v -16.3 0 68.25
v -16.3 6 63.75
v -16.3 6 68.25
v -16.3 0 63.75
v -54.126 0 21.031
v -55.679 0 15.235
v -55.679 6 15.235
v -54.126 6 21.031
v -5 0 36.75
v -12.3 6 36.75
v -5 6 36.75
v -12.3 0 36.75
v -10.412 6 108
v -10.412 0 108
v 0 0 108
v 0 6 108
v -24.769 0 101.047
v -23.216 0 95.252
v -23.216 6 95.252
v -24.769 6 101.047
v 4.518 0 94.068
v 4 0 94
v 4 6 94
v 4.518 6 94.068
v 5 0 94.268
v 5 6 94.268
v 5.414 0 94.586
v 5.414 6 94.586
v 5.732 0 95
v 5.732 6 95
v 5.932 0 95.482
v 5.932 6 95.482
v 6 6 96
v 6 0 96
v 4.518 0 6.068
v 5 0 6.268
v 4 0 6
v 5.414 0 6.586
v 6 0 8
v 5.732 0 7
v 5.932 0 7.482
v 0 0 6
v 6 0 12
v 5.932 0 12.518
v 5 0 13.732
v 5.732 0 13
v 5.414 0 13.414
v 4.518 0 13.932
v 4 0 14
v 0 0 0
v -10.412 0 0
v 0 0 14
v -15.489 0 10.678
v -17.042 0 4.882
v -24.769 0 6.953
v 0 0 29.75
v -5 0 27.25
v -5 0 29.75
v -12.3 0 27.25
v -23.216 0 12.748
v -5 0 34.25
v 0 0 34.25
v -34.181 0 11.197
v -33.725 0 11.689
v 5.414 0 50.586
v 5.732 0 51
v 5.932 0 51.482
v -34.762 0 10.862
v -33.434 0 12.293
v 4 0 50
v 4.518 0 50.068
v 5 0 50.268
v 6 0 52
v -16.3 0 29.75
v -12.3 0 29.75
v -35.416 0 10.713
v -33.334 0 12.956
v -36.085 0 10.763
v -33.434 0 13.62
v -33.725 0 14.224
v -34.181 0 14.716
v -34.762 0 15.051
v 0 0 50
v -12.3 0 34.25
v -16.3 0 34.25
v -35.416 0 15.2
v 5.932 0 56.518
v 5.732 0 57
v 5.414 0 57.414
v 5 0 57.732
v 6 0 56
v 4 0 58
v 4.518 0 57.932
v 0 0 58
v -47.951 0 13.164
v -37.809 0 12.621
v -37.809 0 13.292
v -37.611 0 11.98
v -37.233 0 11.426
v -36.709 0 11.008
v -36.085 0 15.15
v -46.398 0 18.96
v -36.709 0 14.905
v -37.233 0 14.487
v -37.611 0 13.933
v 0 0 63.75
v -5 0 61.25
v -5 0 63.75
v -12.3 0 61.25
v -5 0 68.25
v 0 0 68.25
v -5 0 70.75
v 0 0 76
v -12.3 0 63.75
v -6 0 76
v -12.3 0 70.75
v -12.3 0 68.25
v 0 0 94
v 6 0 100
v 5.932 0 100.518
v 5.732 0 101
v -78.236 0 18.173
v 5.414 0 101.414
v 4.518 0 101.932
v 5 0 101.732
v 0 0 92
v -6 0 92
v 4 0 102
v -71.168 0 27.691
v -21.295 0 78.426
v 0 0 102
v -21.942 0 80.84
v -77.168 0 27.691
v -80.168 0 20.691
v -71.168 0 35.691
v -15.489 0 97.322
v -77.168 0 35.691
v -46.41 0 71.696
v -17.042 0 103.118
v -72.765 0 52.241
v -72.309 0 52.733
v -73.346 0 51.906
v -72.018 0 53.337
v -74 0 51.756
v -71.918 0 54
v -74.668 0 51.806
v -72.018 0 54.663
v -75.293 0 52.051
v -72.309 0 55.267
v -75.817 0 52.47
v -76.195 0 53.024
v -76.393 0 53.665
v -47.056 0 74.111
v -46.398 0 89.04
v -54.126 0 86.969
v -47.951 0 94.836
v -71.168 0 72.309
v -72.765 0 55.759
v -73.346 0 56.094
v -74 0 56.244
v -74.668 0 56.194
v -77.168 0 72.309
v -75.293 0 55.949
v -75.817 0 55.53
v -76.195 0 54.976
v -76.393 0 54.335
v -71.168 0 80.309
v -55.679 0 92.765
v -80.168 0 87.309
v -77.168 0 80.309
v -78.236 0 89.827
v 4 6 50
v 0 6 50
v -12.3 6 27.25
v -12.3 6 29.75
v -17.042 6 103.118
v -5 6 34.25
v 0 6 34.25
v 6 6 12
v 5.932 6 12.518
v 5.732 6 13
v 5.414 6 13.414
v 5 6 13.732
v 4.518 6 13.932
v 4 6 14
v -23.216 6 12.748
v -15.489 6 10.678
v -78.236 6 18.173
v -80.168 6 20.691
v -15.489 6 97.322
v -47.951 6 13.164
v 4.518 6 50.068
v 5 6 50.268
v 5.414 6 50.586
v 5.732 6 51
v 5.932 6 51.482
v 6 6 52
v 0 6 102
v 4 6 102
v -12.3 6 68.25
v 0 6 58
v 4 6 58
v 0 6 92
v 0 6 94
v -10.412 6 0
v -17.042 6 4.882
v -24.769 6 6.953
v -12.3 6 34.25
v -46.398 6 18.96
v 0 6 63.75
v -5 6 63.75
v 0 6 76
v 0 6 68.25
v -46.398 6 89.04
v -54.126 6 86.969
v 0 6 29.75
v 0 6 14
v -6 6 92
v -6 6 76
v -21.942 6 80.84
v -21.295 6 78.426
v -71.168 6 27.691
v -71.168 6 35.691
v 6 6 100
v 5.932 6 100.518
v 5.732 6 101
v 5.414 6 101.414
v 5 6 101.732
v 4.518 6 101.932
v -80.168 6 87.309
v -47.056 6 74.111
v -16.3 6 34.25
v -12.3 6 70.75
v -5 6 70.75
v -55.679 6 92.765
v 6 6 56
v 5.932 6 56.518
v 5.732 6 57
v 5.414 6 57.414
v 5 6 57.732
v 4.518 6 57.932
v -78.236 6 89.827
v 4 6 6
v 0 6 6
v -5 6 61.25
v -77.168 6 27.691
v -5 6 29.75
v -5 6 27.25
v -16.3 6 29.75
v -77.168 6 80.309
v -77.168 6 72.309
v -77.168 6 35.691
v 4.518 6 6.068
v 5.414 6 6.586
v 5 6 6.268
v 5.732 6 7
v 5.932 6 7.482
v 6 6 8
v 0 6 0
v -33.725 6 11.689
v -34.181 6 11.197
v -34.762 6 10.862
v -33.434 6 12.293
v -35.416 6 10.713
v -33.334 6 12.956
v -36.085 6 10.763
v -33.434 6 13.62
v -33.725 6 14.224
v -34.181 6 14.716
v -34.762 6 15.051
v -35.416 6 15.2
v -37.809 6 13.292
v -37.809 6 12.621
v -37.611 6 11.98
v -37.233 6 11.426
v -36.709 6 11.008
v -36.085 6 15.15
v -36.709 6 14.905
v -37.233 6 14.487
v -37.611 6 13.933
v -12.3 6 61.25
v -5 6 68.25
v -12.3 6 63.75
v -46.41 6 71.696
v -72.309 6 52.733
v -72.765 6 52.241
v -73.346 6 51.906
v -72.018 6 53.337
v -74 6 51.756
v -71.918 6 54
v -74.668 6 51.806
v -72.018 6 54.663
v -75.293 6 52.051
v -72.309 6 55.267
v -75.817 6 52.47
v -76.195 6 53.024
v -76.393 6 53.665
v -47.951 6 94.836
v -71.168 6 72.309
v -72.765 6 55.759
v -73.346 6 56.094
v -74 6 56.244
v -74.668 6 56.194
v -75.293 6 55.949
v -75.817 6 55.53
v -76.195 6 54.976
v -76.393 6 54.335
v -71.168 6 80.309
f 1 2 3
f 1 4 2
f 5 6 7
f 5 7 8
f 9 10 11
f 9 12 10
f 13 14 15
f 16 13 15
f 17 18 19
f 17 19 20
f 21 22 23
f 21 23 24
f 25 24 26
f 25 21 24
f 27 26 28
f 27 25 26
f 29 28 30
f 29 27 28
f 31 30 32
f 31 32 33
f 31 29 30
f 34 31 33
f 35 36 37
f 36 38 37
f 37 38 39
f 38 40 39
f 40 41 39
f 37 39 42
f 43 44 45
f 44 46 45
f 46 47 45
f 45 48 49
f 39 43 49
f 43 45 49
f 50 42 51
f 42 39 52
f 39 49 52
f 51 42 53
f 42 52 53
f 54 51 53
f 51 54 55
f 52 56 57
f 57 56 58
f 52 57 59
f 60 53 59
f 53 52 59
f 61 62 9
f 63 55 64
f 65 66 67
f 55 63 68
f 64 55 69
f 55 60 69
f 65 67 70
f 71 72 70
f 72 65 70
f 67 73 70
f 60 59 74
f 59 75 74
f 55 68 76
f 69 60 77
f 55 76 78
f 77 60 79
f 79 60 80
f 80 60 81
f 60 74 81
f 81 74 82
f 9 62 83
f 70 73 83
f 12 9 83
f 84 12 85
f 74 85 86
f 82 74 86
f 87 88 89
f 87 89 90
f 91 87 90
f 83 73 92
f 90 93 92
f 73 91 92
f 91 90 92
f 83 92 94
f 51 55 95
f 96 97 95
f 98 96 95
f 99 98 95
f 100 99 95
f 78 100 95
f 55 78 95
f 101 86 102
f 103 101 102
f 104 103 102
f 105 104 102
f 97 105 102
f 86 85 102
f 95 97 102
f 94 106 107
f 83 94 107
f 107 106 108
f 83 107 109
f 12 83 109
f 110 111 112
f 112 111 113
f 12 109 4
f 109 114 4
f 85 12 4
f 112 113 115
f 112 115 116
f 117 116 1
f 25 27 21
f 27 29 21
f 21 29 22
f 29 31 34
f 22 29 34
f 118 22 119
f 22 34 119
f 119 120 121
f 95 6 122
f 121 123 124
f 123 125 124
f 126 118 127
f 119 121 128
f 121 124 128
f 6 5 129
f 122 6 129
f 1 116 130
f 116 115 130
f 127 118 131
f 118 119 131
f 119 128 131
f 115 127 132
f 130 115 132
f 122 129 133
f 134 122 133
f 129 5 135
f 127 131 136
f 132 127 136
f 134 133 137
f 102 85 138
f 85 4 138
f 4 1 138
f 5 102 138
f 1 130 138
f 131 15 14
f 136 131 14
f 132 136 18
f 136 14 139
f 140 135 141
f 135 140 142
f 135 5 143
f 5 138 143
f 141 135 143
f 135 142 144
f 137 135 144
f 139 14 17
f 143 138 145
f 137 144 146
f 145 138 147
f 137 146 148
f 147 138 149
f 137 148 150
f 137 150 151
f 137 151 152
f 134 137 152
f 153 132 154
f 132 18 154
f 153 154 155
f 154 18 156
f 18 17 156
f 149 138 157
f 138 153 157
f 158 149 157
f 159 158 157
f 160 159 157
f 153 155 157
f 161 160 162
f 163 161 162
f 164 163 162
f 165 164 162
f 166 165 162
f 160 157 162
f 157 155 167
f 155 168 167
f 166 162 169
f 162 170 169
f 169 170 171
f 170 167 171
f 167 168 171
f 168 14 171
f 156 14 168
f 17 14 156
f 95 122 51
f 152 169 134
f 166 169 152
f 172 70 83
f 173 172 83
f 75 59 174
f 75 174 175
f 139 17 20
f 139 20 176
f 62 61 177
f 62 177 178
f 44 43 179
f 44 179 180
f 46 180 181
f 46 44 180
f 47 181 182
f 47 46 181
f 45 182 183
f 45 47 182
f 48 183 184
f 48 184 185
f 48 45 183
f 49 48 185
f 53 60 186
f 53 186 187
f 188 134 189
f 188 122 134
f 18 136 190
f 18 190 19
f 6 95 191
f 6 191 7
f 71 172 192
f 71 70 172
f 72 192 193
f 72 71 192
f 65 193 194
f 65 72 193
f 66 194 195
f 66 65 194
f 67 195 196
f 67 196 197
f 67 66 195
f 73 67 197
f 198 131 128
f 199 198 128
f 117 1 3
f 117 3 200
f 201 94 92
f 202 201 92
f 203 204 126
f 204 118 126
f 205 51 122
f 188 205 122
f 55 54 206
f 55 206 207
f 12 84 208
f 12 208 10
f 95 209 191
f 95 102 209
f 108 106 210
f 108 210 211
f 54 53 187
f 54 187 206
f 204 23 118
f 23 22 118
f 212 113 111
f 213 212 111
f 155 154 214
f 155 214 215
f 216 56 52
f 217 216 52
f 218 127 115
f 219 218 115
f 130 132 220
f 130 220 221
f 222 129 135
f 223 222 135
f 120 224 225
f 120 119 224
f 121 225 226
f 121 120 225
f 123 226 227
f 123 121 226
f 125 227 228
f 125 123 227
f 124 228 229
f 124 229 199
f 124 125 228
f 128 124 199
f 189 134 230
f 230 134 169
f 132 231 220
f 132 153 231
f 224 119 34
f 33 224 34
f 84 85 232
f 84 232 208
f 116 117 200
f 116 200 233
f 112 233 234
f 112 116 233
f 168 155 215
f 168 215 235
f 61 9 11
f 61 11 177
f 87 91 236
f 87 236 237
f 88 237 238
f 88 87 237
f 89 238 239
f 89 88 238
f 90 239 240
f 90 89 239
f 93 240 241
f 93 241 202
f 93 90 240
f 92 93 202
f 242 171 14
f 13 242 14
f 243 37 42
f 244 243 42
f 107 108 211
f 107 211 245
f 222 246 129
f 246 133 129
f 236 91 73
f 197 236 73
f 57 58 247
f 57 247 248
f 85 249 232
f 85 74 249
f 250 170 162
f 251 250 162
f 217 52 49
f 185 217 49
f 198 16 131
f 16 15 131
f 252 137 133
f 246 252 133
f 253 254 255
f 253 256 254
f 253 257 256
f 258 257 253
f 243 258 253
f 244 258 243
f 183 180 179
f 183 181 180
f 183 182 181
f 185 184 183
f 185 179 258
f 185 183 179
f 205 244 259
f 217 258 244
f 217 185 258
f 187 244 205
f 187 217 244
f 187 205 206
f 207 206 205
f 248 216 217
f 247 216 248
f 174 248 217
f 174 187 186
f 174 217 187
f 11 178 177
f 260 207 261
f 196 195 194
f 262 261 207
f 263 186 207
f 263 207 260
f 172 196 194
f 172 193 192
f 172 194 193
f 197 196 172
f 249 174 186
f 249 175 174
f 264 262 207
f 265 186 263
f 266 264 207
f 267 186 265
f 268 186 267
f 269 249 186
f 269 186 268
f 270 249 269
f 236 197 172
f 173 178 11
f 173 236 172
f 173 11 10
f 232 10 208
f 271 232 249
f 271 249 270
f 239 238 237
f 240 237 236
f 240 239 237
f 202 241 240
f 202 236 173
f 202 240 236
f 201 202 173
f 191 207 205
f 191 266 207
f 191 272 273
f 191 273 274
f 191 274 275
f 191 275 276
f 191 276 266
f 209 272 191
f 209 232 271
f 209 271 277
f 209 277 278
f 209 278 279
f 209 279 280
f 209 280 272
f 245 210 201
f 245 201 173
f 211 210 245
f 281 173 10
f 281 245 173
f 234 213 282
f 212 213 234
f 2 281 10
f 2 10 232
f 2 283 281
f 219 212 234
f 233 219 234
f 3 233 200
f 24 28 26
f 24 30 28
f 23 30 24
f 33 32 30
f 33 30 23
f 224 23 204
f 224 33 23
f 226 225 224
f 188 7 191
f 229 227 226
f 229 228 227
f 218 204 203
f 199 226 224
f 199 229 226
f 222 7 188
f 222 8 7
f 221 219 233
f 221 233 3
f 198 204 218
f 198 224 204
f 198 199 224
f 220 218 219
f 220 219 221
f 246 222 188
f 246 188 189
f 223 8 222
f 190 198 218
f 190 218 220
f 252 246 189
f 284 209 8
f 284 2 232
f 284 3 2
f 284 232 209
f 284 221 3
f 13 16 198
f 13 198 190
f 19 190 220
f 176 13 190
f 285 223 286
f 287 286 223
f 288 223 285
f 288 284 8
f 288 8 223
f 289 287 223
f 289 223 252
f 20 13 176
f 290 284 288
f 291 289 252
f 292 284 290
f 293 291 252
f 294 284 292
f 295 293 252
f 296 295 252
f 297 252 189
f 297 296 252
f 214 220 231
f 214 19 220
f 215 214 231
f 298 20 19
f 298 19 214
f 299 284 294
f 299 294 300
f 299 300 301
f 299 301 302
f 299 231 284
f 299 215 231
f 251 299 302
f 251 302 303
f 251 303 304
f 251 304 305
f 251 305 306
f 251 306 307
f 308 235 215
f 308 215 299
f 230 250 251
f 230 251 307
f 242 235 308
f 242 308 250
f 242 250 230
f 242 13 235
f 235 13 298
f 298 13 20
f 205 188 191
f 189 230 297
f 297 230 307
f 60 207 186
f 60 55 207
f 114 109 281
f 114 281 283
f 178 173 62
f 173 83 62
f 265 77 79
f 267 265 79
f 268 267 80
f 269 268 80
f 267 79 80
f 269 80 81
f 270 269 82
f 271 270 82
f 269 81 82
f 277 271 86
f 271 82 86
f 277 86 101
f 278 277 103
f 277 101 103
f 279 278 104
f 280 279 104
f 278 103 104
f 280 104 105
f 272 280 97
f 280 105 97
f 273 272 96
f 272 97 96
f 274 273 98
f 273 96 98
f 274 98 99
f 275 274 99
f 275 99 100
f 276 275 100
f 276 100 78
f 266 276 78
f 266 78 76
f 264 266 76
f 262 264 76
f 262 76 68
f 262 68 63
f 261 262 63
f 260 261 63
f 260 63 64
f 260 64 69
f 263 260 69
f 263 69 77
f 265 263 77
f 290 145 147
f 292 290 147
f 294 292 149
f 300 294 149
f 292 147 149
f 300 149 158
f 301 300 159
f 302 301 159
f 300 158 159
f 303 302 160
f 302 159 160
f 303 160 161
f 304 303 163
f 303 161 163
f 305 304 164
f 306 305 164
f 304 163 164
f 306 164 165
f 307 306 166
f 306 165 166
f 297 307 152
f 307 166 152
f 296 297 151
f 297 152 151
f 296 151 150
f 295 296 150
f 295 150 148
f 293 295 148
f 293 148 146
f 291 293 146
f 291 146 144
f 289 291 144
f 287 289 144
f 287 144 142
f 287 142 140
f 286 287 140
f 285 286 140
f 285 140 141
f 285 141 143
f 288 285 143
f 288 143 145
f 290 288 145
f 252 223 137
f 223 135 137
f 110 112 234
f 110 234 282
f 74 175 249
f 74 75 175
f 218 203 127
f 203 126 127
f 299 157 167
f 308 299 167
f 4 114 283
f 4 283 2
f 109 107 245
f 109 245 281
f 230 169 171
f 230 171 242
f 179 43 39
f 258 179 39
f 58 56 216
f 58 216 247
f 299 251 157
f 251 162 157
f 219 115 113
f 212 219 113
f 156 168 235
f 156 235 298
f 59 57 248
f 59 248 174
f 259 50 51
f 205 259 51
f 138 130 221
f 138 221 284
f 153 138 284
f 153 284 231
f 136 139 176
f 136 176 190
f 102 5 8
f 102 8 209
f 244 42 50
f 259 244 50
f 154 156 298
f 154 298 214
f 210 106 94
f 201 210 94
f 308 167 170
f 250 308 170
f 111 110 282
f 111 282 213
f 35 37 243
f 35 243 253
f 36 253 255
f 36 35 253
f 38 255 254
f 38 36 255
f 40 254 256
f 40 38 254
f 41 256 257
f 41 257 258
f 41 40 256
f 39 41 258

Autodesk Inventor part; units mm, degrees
ref_plane "YZ Plane" through (0, 0, 0) normal (1, 0, 0) x (0, 1, 0)
ref_plane "XZ Plane" through (0, 0, 0) normal (0, 1, 0) x (-1, 0, 0)
ref_plane "XY Plane" through (0, 0, 0) normal (0, 0, 1) x (1, 0, 0)
sketch "Sketch1" plane through (0, 0, 0) normal (0, 1, 0) x (-1, 0, 0)
  line L0 (0, 108) -> (0, 0)
  line L1 (0, 0) -> (10.412, 0)
  line L2 (10.412, 0) -> (80.1677, 18.691)
  line L3 (80.1677, 18.691) -> (80.1677, 89.309)
  line L4 (80.1677, 89.309) -> (10.412, 108)
  line L5 (10.412, 108) -> (0, 108)
  line L6 (2.5529, 107) -> (1, 101.2044) construction
  line L7 (1, 101.2044) -> (68.6148, 83.0871) construction
  line L8 (68.6148, 83.0871) -> (70.1677, 88.8827) construction
  line L9 (70.1677, 88.8827) -> (2.5529, 107) construction
  line L10 (1, 6.7956) -> (2.5529, 1) construction
  line L11 (2.5529, 1) -> (70.1677, 19.1173) construction
  line L12 (70.1677, 19.1173) -> (68.6148, 24.9129) construction
  line L13 (68.6148, 24.9129) -> (1, 6.7956) construction
  line L14 (71.1677, 88.309) -> (77.1677, 88.309) construction
  line L15 (77.1677, 88.309) -> (77.1677, 19.691) construction
  line L16 (77.1677, 19.691) -> (71.1677, 19.691) construction
  line L17 (71.1677, 19.691) -> (71.1677, 88.309) construction
  line L18 (17.0418, 103.1177) -> (15.4889, 97.3222)
  line L19 (15.4889, 97.3222) -> (23.2163, 95.2516)
  line L20 (23.2163, 95.2516) -> (24.7692, 101.0472)
  line L21 (24.7692, 101.0472) -> (17.0418, 103.1177)
  line L22 (47.9514, 94.8355) -> (46.3985, 89.0399)
  line L23 (46.3985, 89.0399) -> (54.1259, 86.9694)
  line L24 (54.1259, 86.9694) -> (55.6788, 92.765)
  line L25 (55.6788, 92.765) -> (47.9514, 94.8355)
  line L26 (15.4889, 10.6778) -> (17.0418, 4.8823)
  line L27 (17.0418, 4.8823) -> (24.7692, 6.9528)
  line L28 (24.7692, 6.9528) -> (23.2163, 12.7484)
  line L29 (23.2163, 12.7484) -> (15.4889, 10.6778)
  line L30 (46.3985, 18.9601) -> (47.9514, 13.1645)
  line L31 (47.9514, 13.1645) -> (55.6788, 15.235)
  line L32 (55.6788, 15.235) -> (54.1259, 21.0306)
  line L33 (54.1259, 21.0306) -> (46.3985, 18.9601)
  line L34 (54.9024, 89.8672) -> (69.3913, 85.9849) construction
  line L35 (16.2653, 7.7801) -> (1.7765, 3.8978) construction
  line L36 (54.9024, 18.1328) -> (69.3913, 22.0151) construction
  line L37 (16.2653, 100.2199) -> (1.7765, 104.1022) construction
  line L38 (71.1677, 80.309) -> (77.1677, 80.309)
  line L39 (77.1677, 80.309) -> (77.1677, 72.309)
  line L40 (77.1677, 72.309) -> (71.1677, 72.309)
  line L41 (71.1677, 72.309) -> (71.1677, 80.309)
  line L42 (71.1677, 35.691) -> (77.1677, 35.691)
  line L43 (77.1677, 35.691) -> (77.1677, 27.691)
  line L44 (77.1677, 27.691) -> (71.1677, 27.691)
  line L45 (71.1677, 27.691) -> (71.1677, 35.691)
  line L46 (74.1677, 80.309) -> (74.1677, 88.309) construction
  line L47 (74.1677, 27.691) -> (74.1677, 19.691) construction
  dimension "d0" = 70
  dimension "d1" = 6
  dimension "d3" = 70
  dimension "d4" = 6
  dimension "d7" = 3
  dimension "d8" = 3
  dimension "d9" = 6
  dimension "d10" = 3
  dimension "d11" = 1
  dimension "d12" = 1
  dimension "d13" = 1
  dimension "d14" = 1
  dimension "d15" = 15
  dimension "d16" = 1
  dimension "d17" = 1
  dimension "d18" = 1
  dimension "d19" = 108
  dimension "d20" = 8
  dimension "d21" = 15
  dimension "d22" = 8
extrude "Extrusion7" add sketch "Sketch1" along normal blind 6
sketch "Sketch7" plane through (0, 0, 0) normal (0, -1, 0) x (1, 0, 0)
  line L0 (0, 0) -> (0, 108) projected
  line L1 (0, 92) -> (-6, 92)
  line L2 (-6, 92) -> (-6, 76)
  line L3 (-6, 76) -> (0, 76)
  line L4 (0, 76) -> (0, 92)
  dimension "d74" = 16
  dimension "d75" = 16
  dimension "d76" = 6
extrude "Extrusion8" cut sketch "Sketch7" against normal blind 6
sketch "Sketch8" plane through (0, 0, 0) normal (0, -1, 0) x (1, 0, 0)
  line L0 (-77.1677, 72.309) -> (-71.1677, 35.691) construction
  line L1 (-77.1677, 35.691) -> (-71.1677, 72.309) construction
  circle A0 centre (-74.1677, 54) radius 2.25
  dimension "d80" = 4.5
extrude "Extrusion9" cut sketch "Sketch8" against normal blind 6
sketch "Sketch9" plane through (0, 0, 0) normal (0, -1, 0) x (1, 0, 0)
  line L0 (-46.3985, 18.9601) -> (-24.7692, 6.9528) construction
  line L1 (-23.2163, 12.7484) -> (-47.9514, 13.1645) construction
  circle A0 centre (-35.5839, 12.9564) radius 2.25
  dimension "d83" = 4.5
extrude "Extrusion10" cut sketch "Sketch9" against normal blind 6
sketch "Sketch10" plane through (0, 0, 0) normal (0, -1, 0) x (1, 0, 0)
  line L0 (0, 0) -> (0, 76) projected
  line L1 (0, 68.25) -> (0, 63.75)
  line L2 (-16.3, 63.75) -> (-16.3, 68.25)
  line L3 (-12.3, 70.75) -> (-5, 70.75)
  line L4 (-5, 61.25) -> (-12.3, 61.25)
  line L5 (-16.3, 68.25) -> (-12.3, 68.25)
  line L6 (-5, 68.25) -> (0, 68.25)
  line L7 (0, 63.75) -> (-5, 63.75)
  line L8 (-12.3, 63.75) -> (-16.3, 63.75)
  line L9 (-12.3, 61.25) -> (-12.3, 63.75)
  line L10 (-12.3, 68.25) -> (-12.3, 70.75)
  line L11 (-5, 70.75) -> (-5, 68.25)
  line L12 (-5, 63.75) -> (-5, 61.25)
  line L13 (0, 34.25) -> (0, 29.75)
  line L14 (-16.3, 29.75) -> (-16.3, 34.25)
  line L15 (-12.3, 36.75) -> (-5, 36.75)
  line L16 (-5, 27.25) -> (-12.3, 27.25)
  line L17 (-16.3, 34.25) -> (-12.3, 34.25)
  line L18 (-5, 34.25) -> (0, 34.25)
  line L19 (0, 29.75) -> (-5, 29.75)
  line L20 (-12.3, 29.75) -> (-16.3, 29.75)
  line L21 (-12.3, 27.25) -> (-12.3, 29.75)
  line L22 (-12.3, 34.25) -> (-12.3, 36.75)
  line L23 (-5, 36.75) -> (-5, 34.25)
  line L24 (-5, 29.75) -> (-5, 27.25)
  point P0 (0, 108)
  point P1 (-16.3, 66)
  point P2 (-16.3, 32)
  dimension "d86" = 4.5
  dimension "d87" = 2.5
  dimension "d88" = 2.5
  dimension "d89" = 5
  dimension "d90" = 7.3
  dimension "d91" = 4
  dimension "d92" = 4.5
  dimension "d93" = 2.5
  dimension "d94" = 2.5
  dimension "d95" = 5
  dimension "d96" = 7.3
  dimension "d97" = 4
  dimension "d98" = 42
  dimension "d99" = 34
extrude "Extrusion11" cut sketch "Sketch10" against normal blind 6
sketch "Sketch11" plane through (0, 0, 0) normal (0, -1, 0) x (1, 0, 0)
  line L0 (0, 68.25) -> (0, 76) projected
  line L1 (0, 108) -> (-10.412, 108) projected
  line L2 (-23.2163, 95.2516) -> (-24.7692, 101.0472) projected
  line L3 (-46.4441, 73.7575) -> (-22.296, 80.228) construction
  line L4 (-22.296, 80.228) -> (-21.9078, 78.7791) construction
  line L5 (-21.9078, 78.7791) -> (-46.0559, 72.3086) construction
  line L6 (-46.0559, 72.3086) -> (-46.4441, 73.7575) construction
  line L7 (-47.0565, 74.1111) -> (-21.9424, 80.8404)
  line L8 (-21.9424, 80.8404) -> (-21.2954, 78.4256)
  line L9 (-21.2954, 78.4256) -> (-46.4095, 71.6963)
  line L10 (-46.4095, 71.6963) -> (-47.0565, 74.1111)
  dimension "d102" = 25
  dimension "d103" = 1.5
  dimension "d104" = 0.5
  dimension "d105" = 22.296
  dimension "d106" = 27.772
extrude "Extrusion12" cut sketch "Sketch11" against normal blind 6
chamfer "Chamfer2" distance 2 angle 45 2 edges at (-80.1677, 3, 89.309) (-80.1677, 3, 18.691)
sketch "Sketch12" plane through (0, 0, 0) normal (0, -1, 0) x (1, 0, 0)
  line L0 (0, 0) -> (0, 29.75) projected
  line L1 (0, 34.25) -> (0, 63.75) projected
  line L2 (0, 92) -> (0, 108) projected
  line L3 (0, 108) -> (-10.412, 108) projected
  line L4 (0, 102) -> (4, 102)
  line L5 (6, 100) -> (6, 96)
  line L6 (4, 94) -> (0, 94)
  line L7 (0, 94) -> (0, 102)
  line L8 (0, 58) -> (4, 58)
  line L9 (6, 56) -> (6, 52)
  line L10 (4, 50) -> (0, 50)
  line L11 (0, 50) -> (0, 58)
  line L12 (0, 14) -> (4, 14)
  line L13 (6, 12) -> (6, 8)
  line L14 (4, 6) -> (0, 6)
  line L15 (0, 6) -> (0, 14)
  arc A0 (6, 100) -> (4, 102) centre (4, 100) ccw
  arc A1 (4, 94) -> (6, 96) centre (4, 96) ccw
  arc A2 (6, 56) -> (4, 58) centre (4, 56) ccw
  arc A3 (4, 50) -> (6, 52) centre (4, 52) ccw
  arc A4 (4, 6) -> (6, 8) centre (4, 8) ccw
  arc A5 (6, 12) -> (4, 14) centre (4, 12) ccw
  dimension "d112" = 2
  dimension "d113" = 8
  dimension "d114" = 8
  dimension "d115" = 8
  dimension "d116" = 6
  dimension "d117" = 6
  dimension "d118" = 36
  dimension "d119" = 36
extrude "Extrusion13" add sketch "Sketch12" against normal blind 6
equation "\"d3\" = d0"
equation "\"d4\" = d1"
equation "\"d8\" = d7"
equation "\"d9\" = d1"
equation "\"d10\" = d7"
equation "\"d12\" = d11"
equation "\"d88\" = d87"
equation "\"d94\" = d93"
properties part number "front_panel_2004_brace_left"
